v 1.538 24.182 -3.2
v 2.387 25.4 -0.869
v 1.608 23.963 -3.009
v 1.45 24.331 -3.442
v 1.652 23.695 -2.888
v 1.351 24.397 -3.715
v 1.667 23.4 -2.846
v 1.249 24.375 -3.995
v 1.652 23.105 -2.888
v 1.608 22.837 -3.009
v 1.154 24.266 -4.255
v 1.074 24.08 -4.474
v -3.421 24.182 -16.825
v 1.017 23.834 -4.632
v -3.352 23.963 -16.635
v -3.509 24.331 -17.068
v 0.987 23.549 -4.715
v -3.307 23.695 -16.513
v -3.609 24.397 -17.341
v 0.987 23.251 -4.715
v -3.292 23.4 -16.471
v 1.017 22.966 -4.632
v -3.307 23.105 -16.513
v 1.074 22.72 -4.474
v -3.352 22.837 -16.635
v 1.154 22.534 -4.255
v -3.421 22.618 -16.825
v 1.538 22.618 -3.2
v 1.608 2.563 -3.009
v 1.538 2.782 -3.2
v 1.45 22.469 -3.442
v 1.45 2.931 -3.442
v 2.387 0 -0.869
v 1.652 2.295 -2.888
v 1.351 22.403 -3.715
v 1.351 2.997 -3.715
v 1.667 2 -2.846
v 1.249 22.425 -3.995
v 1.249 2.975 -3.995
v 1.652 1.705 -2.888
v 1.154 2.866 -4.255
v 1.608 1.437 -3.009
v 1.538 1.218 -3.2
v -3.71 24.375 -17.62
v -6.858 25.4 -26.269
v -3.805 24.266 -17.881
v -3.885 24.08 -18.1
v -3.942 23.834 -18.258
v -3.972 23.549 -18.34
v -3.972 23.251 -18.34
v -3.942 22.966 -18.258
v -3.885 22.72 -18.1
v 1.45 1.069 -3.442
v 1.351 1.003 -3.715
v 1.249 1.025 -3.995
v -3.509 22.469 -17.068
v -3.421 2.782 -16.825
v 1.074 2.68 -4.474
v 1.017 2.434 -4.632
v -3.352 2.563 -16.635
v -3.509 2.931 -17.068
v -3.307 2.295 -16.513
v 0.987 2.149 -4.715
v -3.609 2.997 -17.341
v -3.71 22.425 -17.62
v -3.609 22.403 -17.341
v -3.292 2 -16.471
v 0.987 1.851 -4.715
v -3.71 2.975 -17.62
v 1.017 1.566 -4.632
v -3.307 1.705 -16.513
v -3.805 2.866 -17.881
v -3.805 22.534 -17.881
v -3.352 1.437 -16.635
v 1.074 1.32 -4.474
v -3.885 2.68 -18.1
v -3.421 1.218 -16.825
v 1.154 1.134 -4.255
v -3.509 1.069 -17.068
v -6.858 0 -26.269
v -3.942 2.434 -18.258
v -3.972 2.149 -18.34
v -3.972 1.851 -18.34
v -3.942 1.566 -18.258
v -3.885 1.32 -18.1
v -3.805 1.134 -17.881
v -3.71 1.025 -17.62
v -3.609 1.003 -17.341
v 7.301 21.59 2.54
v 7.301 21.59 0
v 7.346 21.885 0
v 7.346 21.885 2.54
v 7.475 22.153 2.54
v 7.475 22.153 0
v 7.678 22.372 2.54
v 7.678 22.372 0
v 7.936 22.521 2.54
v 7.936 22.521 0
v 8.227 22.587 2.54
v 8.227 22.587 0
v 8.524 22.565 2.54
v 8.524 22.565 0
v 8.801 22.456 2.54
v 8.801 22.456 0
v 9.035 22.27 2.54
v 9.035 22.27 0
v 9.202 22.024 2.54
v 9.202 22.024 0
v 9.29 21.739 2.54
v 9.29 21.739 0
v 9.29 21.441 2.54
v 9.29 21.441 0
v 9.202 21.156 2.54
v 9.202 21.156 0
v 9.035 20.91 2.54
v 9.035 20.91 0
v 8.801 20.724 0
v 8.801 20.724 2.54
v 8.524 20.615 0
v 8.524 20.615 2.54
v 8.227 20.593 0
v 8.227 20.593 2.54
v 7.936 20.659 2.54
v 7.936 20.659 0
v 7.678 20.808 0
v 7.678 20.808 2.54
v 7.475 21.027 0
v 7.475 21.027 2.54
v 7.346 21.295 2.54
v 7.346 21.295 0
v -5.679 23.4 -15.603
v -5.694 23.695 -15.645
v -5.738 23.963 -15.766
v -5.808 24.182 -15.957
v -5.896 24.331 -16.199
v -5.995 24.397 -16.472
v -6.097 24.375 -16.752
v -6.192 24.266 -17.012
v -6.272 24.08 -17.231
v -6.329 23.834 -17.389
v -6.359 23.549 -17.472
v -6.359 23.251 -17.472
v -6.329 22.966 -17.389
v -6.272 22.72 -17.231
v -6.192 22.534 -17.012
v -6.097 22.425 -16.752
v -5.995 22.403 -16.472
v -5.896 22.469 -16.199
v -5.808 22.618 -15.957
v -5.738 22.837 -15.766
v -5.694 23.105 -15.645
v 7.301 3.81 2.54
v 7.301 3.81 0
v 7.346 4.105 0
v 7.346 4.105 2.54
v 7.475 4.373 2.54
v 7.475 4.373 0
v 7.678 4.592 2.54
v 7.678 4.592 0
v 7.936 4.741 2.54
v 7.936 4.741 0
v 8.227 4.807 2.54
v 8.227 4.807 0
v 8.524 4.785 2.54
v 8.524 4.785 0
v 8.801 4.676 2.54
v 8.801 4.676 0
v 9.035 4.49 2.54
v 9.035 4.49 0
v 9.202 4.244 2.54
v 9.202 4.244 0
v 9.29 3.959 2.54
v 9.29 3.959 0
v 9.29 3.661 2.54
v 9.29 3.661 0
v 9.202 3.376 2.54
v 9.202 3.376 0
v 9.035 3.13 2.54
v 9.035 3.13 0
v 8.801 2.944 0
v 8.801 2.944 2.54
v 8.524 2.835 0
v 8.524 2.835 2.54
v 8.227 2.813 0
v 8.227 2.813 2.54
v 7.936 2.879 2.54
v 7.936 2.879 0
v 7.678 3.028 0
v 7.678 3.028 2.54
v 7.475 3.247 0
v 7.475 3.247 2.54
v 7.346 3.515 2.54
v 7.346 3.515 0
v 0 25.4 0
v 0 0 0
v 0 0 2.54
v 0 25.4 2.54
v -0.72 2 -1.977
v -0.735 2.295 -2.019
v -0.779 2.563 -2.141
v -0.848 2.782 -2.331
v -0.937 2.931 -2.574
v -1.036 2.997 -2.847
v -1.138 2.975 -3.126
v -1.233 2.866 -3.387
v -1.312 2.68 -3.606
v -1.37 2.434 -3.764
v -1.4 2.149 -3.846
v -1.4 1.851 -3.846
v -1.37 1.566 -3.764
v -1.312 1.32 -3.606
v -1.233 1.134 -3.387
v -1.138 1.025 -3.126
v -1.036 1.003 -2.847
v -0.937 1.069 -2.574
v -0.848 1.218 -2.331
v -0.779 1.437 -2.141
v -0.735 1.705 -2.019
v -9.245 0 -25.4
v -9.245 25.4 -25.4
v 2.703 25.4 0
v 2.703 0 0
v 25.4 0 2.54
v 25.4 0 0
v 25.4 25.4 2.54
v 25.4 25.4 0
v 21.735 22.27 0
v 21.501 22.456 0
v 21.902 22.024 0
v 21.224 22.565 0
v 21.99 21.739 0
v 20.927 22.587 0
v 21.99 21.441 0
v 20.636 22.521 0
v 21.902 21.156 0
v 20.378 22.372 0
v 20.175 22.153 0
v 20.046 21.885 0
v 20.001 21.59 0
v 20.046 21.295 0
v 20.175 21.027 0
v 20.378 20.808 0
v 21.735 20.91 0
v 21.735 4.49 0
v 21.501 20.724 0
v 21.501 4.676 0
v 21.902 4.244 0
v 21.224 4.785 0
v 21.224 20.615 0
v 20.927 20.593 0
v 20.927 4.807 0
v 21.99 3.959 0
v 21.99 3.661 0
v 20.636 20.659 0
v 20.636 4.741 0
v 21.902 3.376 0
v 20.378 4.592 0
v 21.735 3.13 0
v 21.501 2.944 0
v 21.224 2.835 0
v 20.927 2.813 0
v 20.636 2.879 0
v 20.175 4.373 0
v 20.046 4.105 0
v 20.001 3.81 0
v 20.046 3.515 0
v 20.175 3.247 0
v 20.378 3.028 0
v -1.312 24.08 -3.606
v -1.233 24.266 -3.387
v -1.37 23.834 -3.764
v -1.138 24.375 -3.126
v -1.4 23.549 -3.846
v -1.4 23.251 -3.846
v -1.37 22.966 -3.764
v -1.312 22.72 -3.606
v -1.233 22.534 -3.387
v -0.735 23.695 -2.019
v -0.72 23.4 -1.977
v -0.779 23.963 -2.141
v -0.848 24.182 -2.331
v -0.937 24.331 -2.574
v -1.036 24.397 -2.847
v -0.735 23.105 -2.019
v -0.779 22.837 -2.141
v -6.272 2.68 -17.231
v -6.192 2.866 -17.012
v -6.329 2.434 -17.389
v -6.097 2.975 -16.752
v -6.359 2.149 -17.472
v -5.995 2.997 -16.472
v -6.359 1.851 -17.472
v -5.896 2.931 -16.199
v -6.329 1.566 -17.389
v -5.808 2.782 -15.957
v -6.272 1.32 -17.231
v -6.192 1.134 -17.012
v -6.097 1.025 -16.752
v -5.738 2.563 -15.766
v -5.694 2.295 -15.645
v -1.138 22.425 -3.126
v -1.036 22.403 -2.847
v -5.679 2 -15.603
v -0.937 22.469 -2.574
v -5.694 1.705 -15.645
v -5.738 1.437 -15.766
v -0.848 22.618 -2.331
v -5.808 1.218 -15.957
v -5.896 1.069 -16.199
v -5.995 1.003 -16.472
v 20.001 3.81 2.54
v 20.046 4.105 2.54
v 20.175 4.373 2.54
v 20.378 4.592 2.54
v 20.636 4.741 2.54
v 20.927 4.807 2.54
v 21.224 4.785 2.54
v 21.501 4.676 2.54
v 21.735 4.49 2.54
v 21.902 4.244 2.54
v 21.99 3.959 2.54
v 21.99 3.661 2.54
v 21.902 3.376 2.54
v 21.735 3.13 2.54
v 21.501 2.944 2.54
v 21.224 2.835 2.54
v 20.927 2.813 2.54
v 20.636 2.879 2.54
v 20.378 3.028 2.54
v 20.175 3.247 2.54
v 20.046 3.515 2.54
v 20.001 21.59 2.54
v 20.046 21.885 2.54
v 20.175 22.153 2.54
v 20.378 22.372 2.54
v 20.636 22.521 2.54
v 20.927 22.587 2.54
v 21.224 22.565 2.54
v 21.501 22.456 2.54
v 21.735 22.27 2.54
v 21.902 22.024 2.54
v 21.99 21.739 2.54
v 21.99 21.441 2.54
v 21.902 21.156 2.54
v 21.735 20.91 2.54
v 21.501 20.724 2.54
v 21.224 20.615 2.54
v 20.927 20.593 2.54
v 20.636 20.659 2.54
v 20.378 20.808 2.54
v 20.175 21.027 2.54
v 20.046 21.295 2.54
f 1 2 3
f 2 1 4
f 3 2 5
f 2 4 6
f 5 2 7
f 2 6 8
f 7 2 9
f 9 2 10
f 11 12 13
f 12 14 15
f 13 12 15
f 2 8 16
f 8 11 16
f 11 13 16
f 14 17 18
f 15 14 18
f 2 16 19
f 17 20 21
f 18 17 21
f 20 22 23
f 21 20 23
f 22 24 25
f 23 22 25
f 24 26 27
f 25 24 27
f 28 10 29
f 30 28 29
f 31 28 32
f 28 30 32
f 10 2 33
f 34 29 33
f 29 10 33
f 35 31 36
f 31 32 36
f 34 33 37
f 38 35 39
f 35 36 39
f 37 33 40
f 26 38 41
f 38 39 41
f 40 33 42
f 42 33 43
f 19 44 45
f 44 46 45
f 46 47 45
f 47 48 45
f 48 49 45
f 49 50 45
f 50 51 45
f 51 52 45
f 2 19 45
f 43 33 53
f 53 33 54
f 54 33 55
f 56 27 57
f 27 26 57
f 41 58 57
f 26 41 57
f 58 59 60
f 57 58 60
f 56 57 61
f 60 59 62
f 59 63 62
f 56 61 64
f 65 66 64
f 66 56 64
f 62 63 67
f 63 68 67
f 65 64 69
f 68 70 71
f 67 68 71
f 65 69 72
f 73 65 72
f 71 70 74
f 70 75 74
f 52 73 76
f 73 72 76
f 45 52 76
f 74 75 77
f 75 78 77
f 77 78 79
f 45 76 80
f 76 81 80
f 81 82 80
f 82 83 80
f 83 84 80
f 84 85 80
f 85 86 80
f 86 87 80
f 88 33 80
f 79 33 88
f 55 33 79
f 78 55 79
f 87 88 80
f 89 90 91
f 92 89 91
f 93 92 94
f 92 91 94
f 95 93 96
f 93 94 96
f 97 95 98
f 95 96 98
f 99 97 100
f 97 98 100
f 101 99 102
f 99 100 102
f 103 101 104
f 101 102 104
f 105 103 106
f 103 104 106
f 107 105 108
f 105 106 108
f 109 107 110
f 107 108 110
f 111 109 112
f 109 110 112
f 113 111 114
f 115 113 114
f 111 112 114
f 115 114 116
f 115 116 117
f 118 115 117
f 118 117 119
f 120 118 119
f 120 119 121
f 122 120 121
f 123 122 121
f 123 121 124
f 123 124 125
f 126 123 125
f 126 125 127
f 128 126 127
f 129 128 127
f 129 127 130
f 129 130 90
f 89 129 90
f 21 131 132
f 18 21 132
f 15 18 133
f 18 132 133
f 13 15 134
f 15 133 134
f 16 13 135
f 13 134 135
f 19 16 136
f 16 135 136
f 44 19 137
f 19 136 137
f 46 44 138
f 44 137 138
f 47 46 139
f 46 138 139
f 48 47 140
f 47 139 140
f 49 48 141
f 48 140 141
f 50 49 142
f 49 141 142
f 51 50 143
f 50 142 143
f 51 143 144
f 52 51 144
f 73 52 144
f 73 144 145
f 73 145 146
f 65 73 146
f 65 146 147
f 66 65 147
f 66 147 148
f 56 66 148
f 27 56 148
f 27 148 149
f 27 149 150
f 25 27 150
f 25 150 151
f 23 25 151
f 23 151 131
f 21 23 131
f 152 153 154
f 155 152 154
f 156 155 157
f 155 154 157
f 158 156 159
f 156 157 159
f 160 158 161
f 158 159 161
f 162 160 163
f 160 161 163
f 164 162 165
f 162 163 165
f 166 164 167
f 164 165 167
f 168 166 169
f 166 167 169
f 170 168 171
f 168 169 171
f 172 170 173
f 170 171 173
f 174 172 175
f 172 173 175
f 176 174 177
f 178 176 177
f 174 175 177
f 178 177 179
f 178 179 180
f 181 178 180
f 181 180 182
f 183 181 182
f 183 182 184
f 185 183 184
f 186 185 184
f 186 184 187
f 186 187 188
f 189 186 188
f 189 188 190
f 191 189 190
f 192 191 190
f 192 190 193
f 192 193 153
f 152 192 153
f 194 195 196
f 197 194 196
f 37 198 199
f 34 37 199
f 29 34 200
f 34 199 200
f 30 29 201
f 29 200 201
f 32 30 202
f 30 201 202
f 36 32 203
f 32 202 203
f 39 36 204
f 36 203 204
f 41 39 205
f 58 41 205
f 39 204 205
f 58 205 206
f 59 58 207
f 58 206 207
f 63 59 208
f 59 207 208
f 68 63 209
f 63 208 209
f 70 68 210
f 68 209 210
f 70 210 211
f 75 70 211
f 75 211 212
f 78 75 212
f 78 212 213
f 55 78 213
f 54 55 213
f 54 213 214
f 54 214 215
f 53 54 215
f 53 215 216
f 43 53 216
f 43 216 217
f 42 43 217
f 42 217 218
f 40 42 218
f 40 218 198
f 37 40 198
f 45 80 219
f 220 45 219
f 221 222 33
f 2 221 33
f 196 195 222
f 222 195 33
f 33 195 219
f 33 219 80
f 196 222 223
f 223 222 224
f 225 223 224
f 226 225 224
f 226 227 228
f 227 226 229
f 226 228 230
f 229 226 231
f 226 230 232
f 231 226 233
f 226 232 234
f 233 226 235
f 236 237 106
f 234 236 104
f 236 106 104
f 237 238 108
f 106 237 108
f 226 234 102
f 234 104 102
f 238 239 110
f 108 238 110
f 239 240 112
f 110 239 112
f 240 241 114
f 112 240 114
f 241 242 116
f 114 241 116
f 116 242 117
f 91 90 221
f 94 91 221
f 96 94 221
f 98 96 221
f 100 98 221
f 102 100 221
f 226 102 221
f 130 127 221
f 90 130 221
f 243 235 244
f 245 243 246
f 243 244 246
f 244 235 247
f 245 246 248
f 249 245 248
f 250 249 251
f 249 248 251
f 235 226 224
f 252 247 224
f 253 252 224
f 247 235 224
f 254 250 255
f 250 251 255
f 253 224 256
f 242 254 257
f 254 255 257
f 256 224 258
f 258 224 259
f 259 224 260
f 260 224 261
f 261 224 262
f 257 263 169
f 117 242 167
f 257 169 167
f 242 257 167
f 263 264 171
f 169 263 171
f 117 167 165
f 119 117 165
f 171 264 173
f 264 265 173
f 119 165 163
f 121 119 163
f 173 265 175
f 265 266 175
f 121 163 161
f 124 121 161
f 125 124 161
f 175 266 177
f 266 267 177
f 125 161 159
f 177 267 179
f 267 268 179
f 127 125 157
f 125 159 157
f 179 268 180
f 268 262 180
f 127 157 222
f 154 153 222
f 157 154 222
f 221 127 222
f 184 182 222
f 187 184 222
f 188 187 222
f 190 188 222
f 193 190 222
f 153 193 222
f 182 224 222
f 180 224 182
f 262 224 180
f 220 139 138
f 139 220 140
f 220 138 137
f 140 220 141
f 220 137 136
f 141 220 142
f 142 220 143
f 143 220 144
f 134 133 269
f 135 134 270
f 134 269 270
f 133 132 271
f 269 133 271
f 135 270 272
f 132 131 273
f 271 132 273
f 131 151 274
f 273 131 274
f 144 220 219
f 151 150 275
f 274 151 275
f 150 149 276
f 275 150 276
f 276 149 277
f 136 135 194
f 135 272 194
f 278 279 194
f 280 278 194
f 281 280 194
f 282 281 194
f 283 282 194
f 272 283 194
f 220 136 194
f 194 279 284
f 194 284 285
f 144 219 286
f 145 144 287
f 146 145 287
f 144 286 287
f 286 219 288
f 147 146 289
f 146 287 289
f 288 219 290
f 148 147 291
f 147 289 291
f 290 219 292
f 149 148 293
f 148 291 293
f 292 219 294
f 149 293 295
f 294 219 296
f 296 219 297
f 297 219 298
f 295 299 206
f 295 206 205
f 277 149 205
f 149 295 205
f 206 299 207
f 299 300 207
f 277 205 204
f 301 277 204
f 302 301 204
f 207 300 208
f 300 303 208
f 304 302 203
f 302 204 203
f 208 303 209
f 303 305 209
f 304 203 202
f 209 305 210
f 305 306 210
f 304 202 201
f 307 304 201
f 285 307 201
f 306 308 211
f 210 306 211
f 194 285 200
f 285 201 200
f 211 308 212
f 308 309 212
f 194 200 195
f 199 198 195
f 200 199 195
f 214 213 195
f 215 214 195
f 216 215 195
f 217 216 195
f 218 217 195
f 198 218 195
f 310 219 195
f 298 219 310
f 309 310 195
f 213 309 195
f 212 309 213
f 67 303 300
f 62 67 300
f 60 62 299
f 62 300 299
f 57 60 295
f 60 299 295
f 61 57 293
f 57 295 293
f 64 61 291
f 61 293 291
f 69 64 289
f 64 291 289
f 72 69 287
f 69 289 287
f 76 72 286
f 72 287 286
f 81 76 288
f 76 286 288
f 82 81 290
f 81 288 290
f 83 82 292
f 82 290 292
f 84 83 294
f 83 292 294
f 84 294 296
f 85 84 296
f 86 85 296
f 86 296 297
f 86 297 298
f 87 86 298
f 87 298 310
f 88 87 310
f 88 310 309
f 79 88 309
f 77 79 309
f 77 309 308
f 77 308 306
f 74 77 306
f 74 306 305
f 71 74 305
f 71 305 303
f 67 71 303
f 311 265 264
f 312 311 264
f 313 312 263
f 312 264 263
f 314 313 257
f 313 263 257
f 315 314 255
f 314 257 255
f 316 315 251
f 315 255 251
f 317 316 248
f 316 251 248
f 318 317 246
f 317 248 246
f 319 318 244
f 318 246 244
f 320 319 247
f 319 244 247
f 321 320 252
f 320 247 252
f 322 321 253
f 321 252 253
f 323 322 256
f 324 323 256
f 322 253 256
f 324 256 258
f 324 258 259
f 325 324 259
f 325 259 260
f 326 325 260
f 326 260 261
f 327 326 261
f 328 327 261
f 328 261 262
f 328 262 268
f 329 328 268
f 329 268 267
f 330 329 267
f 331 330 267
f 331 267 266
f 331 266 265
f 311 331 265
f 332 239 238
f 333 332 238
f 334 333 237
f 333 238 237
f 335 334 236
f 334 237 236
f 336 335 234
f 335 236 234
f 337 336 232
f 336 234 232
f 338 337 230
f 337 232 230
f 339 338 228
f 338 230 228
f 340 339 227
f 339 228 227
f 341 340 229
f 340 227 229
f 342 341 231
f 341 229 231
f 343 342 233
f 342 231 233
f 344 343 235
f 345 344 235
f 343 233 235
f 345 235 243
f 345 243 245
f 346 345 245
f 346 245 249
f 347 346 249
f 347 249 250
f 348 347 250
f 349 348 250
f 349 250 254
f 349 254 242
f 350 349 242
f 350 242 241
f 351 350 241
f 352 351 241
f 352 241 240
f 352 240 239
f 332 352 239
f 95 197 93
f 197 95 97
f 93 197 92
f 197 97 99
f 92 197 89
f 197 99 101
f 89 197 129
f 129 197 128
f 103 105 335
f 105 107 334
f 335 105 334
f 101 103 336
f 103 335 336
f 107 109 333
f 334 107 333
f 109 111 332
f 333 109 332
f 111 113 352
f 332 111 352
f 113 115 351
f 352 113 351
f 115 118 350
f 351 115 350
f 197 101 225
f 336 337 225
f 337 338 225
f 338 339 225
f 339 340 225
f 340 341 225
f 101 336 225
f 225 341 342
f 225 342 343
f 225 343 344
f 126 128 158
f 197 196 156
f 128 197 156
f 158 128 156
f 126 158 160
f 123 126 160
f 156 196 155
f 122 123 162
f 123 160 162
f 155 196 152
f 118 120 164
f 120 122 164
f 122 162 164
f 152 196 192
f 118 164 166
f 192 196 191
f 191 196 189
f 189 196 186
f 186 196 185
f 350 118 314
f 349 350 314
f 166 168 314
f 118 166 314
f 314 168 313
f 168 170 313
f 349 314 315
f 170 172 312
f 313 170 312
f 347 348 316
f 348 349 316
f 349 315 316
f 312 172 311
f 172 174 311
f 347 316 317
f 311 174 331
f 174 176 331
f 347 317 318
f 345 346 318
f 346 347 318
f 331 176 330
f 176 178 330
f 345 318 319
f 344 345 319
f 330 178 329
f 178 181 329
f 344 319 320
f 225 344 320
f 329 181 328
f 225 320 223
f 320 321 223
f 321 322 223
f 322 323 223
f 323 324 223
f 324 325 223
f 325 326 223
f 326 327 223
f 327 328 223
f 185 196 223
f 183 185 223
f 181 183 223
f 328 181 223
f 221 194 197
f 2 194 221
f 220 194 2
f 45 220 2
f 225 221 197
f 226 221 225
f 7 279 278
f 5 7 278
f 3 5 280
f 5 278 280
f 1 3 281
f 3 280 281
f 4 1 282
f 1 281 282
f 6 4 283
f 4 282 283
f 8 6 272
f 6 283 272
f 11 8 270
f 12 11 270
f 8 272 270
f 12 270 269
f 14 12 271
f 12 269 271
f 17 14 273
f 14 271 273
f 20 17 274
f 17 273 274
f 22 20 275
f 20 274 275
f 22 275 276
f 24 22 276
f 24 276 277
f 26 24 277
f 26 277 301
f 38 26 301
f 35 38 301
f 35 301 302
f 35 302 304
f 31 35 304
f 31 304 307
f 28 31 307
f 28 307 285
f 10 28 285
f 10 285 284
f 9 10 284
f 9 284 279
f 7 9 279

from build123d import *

# Parameters (mm, degrees)
BOSS_EXTRUDE1_DEPTH = 25.4
CUT_EXTRUDE1_DEPTH  = 25.4
SKETCH2_4_R         = 1
CUT_EXTRUDE2_DEPTH  = 25.4
SKETCH2_5_R         = 1
CUT_EXTRUDE3_DEPTH  = 25.4
SKETCH2_6_R         = 1
CUT_EXTRUDE4_DEPTH  = 25.4
SKETCH3_R           = 1
CUT_EXTRUDE5_DEPTH  = 25.4


with BuildPart() as part:
    # Sketch1 → Boss-Extrude1 (new body)
    with BuildSketch(Plane(origin=(0, 0, 0), x_dir=(1, 0, 0), z_dir=(0, 1, 0))):
        Polygon((0, 0), (0, -2.54), (25.4, -2.54), (25.4, 0), (2.703011542, 0), (2.386819257, 0.868731164), (-6.858024694, 26.268731164), (-9.24484395, 25.4), align=None)
    extrude(amount=BOSS_EXTRUDE1_DEPTH)

    # Sketch2 → Cut-Extrude1 (cut)
    with BuildSketch(Plane(origin=(0, 0, 0), x_dir=(0.3420201433256697, 0, 0.9396926207859081), z_dir=(-0.939692620785908, 0, 0.34202014332566966))):
        with BuildLine():
            ThreePointArc((-18.604115421, 2), (-17.604115421, 1), (-16.604115421, 2))
            ThreePointArc((-16.604115421, 2), (-17.604115421, 3), (-18.604115421, 2))
        make_face()
    extrude(amount=-CUT_EXTRUDE1_DEPTH, mode=Mode.SUBTRACT)

    # Sketch2<4> → Cut-Extrude2 (cut)
    with BuildSketch(Plane(origin=(0, 0, 0), x_dir=(0.3420201433256697, 0, 0.9396926207859081), z_dir=(-0.939692620785908, 0, 0.34202014332566966))):
        with Locations((-17.604115421, 23.4)):
            Circle(SKETCH2_4_R)
    extrude(amount=-CUT_EXTRUDE2_DEPTH, mode=Mode.SUBTRACT)

    # Sketch2<5> → Cut-Extrude3 (cut)
    with BuildSketch(Plane(origin=(0, 0, 0), x_dir=(0.3420201433256697, 0, 0.9396926207859081), z_dir=(-0.939692620785908, 0, 0.34202014332566966))):
        with Locations((-3.104115421, 2)):
            Circle(SKETCH2_5_R)
    extrude(amount=-CUT_EXTRUDE3_DEPTH, mode=Mode.SUBTRACT)

    # Sketch2<6> → Cut-Extrude4 (cut)
    with BuildSketch(Plane(origin=(0, 0, 0), x_dir=(0.3420201433256697, 0, 0.9396926207859081), z_dir=(-0.939692620785908, 0, 0.34202014332566966))):
        with Locations((-3.104115421, 23.4)):
            Circle(SKETCH2_6_R)
    extrude(amount=-CUT_EXTRUDE4_DEPTH, mode=Mode.SUBTRACT)

    # Sketch3 → Cut-Extrude5 (cut)
    with BuildSketch(Plane(origin=(0, 0, 0), x_dir=(-1, 0, 0), z_dir=(0, 0, -1))):
        with Locations((-21.001496496, 21.59)):
            Circle(SKETCH3_R)
        with Locations((-21.001496496, 3.81)):
            Circle(SKETCH3_R)
        with Locations((-8.301496496, 21.59)):
            Circle(SKETCH3_R)
        with Locations((-8.301496496, 3.81)):
            Circle(SKETCH3_R)
    extrude(amount=-CUT_EXTRUDE5_DEPTH, mode=Mode.SUBTRACT)


solid = part.part
